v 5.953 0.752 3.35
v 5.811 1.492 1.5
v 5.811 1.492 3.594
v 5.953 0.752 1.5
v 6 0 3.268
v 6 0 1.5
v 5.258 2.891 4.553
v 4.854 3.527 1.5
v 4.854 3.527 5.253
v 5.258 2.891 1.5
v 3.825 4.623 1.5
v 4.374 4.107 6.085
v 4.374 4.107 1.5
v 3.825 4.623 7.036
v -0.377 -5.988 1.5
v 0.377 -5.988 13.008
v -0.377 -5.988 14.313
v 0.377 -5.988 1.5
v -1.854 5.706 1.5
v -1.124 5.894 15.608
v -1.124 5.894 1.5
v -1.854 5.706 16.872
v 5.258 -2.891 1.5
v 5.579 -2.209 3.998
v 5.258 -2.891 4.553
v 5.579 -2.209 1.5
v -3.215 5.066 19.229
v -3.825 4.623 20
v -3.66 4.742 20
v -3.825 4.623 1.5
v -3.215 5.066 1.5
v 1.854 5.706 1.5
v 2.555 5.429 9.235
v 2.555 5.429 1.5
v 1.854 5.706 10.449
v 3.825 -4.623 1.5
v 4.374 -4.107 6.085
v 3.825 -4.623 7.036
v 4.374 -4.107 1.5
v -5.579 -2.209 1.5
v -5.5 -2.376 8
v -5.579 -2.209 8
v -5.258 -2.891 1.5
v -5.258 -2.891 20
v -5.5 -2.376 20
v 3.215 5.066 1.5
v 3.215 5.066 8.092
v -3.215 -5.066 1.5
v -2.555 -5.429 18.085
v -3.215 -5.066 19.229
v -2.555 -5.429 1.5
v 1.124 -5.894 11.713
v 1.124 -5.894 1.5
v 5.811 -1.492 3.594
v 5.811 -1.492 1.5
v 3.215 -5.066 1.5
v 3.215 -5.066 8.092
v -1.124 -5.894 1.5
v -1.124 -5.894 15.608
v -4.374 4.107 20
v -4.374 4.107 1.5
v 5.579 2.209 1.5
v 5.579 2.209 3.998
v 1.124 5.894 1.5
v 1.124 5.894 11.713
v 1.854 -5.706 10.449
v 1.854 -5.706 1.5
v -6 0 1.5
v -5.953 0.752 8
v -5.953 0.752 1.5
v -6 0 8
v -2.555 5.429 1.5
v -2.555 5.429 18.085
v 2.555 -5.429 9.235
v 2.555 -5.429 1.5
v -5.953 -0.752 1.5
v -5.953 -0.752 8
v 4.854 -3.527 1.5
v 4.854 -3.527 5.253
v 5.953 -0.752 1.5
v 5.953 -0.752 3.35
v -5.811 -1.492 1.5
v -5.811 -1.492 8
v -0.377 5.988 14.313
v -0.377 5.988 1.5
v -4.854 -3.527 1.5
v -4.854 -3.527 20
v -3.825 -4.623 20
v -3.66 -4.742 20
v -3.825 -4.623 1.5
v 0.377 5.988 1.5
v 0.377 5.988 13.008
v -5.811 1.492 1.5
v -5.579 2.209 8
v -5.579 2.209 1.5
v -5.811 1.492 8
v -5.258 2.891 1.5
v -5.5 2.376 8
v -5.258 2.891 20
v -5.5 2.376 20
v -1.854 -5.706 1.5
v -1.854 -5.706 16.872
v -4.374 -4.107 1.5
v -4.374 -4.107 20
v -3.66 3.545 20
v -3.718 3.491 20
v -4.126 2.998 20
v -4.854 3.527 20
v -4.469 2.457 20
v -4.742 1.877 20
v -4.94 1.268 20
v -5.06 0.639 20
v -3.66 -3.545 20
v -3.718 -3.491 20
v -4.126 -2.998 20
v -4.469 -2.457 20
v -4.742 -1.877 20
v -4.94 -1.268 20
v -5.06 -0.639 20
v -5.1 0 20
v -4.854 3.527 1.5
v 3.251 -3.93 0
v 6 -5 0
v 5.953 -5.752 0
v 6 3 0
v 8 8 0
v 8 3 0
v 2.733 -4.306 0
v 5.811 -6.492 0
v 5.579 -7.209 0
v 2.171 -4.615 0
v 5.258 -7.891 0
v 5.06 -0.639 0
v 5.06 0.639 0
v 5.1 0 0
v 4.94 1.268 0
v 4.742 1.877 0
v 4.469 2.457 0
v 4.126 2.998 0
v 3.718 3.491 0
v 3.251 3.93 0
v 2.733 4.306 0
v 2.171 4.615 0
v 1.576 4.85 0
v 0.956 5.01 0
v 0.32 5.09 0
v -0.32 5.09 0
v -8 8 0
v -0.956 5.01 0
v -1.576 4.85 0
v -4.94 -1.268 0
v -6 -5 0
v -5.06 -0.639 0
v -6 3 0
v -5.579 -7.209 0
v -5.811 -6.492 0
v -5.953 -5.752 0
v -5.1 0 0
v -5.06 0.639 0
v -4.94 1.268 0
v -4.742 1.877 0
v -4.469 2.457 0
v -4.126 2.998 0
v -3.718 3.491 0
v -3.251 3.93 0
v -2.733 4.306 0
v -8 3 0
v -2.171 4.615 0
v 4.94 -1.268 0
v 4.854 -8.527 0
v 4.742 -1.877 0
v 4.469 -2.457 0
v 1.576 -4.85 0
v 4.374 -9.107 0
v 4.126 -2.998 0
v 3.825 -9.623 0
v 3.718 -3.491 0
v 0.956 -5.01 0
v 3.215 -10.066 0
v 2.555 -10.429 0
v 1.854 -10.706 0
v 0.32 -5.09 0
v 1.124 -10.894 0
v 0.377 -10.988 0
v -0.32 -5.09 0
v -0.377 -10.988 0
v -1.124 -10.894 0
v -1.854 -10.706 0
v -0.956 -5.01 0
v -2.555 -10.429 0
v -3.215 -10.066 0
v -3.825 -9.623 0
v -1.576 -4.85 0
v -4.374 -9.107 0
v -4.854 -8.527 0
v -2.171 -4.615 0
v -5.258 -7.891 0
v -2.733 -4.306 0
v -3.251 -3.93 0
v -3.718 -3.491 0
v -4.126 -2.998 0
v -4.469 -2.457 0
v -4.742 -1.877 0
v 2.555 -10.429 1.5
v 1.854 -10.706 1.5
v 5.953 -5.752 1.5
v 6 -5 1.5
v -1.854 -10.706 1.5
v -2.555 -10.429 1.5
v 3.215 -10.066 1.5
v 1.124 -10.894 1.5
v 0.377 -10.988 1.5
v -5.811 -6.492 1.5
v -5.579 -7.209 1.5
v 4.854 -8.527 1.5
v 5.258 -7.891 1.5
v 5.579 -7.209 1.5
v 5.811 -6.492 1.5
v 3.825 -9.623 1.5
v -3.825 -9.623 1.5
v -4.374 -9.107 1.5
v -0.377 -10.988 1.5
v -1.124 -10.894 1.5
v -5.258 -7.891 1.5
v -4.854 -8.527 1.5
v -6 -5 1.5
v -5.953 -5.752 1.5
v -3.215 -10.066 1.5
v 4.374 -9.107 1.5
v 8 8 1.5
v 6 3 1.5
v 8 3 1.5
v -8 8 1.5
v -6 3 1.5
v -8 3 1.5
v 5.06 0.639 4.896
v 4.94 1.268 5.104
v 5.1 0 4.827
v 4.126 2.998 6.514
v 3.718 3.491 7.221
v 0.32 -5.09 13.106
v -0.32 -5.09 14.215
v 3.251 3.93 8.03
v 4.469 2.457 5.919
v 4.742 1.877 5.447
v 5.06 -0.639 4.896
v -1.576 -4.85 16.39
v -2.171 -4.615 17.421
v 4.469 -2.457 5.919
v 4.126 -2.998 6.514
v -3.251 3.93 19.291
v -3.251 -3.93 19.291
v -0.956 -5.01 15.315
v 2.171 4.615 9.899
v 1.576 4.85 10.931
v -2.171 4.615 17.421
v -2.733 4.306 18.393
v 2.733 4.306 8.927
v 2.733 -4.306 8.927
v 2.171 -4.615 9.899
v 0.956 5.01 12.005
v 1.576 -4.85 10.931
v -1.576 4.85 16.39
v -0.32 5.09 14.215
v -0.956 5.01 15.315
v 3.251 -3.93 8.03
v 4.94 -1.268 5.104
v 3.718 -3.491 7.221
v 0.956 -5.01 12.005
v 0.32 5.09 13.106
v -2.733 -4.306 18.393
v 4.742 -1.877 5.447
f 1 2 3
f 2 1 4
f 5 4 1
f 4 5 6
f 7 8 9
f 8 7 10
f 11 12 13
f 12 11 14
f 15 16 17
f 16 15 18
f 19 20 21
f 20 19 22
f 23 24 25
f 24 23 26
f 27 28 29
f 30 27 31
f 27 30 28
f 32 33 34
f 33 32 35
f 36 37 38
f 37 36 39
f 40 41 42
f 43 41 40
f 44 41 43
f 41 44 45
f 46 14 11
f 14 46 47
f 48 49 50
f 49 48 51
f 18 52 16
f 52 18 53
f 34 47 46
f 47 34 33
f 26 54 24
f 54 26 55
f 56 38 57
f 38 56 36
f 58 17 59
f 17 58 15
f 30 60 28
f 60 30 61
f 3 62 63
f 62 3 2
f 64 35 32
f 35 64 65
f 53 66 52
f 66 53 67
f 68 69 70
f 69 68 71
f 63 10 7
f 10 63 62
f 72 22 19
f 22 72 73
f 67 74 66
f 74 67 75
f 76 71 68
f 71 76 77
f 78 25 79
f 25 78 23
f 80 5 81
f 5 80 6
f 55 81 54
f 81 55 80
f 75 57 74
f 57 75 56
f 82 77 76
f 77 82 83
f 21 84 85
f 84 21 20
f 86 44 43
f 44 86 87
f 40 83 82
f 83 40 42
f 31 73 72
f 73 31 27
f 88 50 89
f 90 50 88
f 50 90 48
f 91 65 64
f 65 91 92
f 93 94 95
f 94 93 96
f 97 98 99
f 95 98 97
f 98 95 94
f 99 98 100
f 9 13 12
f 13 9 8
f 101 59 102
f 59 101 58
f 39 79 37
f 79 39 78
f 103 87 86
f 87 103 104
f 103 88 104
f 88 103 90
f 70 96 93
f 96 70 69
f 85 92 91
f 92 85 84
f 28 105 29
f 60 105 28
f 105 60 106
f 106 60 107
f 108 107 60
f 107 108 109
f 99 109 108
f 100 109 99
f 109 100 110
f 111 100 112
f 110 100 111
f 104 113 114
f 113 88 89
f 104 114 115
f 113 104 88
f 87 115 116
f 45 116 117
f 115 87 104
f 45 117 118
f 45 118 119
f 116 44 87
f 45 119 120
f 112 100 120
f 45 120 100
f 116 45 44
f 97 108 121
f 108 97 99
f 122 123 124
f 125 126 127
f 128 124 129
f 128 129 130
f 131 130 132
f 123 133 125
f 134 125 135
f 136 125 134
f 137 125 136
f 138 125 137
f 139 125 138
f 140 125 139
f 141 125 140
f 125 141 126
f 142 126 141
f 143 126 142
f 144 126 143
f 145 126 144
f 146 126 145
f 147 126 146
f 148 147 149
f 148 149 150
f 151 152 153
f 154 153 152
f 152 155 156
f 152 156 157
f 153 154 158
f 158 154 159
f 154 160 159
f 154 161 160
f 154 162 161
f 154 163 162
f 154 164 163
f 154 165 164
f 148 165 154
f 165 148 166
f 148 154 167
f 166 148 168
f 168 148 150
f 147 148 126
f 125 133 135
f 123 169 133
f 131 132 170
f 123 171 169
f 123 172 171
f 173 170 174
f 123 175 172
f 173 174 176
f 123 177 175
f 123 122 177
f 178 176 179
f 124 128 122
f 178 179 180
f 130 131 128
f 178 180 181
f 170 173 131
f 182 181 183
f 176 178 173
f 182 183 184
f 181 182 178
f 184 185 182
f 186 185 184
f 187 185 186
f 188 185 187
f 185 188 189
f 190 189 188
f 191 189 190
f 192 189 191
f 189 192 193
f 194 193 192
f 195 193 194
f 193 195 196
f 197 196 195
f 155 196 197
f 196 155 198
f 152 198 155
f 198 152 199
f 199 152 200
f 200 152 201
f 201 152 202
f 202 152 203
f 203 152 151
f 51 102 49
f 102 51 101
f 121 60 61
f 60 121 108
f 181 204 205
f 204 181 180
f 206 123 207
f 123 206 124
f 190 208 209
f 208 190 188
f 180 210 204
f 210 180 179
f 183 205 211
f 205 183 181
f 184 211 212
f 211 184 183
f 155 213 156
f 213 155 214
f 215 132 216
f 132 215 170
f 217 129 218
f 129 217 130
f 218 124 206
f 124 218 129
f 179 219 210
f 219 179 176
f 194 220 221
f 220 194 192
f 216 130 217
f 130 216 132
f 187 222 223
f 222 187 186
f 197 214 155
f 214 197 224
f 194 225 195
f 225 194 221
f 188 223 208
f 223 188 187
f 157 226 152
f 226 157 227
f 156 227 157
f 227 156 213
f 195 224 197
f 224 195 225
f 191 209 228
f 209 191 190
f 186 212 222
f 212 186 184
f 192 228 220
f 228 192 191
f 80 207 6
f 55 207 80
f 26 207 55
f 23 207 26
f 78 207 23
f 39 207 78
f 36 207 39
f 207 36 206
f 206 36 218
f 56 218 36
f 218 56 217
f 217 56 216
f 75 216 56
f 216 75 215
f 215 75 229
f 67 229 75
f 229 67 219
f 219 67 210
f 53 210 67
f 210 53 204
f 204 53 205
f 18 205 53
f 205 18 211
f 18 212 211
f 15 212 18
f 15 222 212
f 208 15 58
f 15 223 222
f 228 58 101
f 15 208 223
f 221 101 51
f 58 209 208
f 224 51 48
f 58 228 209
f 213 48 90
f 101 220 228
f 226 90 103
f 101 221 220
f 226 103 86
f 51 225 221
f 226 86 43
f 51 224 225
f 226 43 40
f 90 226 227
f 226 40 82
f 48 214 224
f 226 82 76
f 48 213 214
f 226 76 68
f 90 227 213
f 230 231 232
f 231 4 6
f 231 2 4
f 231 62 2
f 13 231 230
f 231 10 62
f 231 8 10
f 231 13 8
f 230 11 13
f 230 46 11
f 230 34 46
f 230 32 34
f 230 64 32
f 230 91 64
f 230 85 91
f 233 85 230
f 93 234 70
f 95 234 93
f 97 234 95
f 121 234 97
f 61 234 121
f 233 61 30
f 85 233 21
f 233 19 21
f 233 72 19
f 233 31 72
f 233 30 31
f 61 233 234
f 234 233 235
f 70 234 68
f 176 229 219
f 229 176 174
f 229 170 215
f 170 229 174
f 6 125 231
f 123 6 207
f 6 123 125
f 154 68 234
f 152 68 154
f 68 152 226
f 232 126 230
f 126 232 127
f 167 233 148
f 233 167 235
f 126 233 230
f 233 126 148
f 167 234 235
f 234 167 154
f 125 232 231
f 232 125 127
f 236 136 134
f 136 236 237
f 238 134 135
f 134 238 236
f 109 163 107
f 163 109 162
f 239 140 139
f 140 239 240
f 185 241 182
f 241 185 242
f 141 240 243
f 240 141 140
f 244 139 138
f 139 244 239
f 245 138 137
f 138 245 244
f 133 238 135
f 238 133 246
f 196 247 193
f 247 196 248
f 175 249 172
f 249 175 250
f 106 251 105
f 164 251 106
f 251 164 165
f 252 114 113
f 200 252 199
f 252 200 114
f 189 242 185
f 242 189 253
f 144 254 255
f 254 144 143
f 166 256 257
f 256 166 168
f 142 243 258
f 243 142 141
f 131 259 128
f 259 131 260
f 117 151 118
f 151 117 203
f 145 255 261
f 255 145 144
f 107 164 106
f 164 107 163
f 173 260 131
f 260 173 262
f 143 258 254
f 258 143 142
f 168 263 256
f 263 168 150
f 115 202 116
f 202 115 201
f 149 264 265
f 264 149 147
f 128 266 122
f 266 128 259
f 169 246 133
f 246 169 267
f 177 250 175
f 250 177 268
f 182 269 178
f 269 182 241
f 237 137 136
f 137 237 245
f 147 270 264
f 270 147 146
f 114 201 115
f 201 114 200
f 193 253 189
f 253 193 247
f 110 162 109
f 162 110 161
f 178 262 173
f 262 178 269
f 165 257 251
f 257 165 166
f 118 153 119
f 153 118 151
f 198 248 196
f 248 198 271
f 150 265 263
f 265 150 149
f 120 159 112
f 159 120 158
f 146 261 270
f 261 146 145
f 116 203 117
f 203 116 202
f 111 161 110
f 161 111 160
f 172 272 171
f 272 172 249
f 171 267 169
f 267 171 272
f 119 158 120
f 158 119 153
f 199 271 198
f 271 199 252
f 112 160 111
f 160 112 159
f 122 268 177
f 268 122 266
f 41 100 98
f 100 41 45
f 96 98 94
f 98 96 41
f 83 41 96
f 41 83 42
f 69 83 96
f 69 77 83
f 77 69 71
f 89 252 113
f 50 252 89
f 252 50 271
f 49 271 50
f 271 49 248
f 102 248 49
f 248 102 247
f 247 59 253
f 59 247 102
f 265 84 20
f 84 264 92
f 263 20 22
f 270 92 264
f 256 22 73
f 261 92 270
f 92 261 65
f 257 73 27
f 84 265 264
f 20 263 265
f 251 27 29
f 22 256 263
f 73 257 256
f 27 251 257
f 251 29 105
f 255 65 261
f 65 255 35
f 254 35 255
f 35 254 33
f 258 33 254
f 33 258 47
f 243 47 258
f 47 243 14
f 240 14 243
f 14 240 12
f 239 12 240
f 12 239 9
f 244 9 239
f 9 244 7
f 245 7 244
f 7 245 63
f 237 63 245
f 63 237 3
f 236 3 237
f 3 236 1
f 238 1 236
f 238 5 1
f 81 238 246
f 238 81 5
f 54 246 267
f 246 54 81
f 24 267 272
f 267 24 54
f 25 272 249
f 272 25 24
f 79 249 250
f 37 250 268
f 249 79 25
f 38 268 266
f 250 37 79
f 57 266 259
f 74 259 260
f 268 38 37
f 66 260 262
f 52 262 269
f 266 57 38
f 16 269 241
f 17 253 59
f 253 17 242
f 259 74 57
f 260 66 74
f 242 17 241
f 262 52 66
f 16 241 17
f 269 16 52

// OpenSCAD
h = 20;
$fn=50;

module guide() {
    do = 12;
    di = 10.2;
    base_t1 = 1.5;
    difference() {
        union() {
            cylinder(d=do, h=h); 
            translate([0,-5,0])     cylinder(d=do, h=base_t1);
            translate([-do/2,-5,0]) cube([do,do,base_t1]);
            translate([-do/2-2,3,0]) cube([do+4,5,base_t1]);
        }
        {
            translate([0,0,-0.1]) cylinder(d=di, h=h+2);
            translate([-do/2-0.5,-do/2, 8]) cube([1,do,h]);
            translate([5,0,15]) rotate([0,-30,0]) cube([10, do, 25], center=true);
        }
    }
}

guide();
